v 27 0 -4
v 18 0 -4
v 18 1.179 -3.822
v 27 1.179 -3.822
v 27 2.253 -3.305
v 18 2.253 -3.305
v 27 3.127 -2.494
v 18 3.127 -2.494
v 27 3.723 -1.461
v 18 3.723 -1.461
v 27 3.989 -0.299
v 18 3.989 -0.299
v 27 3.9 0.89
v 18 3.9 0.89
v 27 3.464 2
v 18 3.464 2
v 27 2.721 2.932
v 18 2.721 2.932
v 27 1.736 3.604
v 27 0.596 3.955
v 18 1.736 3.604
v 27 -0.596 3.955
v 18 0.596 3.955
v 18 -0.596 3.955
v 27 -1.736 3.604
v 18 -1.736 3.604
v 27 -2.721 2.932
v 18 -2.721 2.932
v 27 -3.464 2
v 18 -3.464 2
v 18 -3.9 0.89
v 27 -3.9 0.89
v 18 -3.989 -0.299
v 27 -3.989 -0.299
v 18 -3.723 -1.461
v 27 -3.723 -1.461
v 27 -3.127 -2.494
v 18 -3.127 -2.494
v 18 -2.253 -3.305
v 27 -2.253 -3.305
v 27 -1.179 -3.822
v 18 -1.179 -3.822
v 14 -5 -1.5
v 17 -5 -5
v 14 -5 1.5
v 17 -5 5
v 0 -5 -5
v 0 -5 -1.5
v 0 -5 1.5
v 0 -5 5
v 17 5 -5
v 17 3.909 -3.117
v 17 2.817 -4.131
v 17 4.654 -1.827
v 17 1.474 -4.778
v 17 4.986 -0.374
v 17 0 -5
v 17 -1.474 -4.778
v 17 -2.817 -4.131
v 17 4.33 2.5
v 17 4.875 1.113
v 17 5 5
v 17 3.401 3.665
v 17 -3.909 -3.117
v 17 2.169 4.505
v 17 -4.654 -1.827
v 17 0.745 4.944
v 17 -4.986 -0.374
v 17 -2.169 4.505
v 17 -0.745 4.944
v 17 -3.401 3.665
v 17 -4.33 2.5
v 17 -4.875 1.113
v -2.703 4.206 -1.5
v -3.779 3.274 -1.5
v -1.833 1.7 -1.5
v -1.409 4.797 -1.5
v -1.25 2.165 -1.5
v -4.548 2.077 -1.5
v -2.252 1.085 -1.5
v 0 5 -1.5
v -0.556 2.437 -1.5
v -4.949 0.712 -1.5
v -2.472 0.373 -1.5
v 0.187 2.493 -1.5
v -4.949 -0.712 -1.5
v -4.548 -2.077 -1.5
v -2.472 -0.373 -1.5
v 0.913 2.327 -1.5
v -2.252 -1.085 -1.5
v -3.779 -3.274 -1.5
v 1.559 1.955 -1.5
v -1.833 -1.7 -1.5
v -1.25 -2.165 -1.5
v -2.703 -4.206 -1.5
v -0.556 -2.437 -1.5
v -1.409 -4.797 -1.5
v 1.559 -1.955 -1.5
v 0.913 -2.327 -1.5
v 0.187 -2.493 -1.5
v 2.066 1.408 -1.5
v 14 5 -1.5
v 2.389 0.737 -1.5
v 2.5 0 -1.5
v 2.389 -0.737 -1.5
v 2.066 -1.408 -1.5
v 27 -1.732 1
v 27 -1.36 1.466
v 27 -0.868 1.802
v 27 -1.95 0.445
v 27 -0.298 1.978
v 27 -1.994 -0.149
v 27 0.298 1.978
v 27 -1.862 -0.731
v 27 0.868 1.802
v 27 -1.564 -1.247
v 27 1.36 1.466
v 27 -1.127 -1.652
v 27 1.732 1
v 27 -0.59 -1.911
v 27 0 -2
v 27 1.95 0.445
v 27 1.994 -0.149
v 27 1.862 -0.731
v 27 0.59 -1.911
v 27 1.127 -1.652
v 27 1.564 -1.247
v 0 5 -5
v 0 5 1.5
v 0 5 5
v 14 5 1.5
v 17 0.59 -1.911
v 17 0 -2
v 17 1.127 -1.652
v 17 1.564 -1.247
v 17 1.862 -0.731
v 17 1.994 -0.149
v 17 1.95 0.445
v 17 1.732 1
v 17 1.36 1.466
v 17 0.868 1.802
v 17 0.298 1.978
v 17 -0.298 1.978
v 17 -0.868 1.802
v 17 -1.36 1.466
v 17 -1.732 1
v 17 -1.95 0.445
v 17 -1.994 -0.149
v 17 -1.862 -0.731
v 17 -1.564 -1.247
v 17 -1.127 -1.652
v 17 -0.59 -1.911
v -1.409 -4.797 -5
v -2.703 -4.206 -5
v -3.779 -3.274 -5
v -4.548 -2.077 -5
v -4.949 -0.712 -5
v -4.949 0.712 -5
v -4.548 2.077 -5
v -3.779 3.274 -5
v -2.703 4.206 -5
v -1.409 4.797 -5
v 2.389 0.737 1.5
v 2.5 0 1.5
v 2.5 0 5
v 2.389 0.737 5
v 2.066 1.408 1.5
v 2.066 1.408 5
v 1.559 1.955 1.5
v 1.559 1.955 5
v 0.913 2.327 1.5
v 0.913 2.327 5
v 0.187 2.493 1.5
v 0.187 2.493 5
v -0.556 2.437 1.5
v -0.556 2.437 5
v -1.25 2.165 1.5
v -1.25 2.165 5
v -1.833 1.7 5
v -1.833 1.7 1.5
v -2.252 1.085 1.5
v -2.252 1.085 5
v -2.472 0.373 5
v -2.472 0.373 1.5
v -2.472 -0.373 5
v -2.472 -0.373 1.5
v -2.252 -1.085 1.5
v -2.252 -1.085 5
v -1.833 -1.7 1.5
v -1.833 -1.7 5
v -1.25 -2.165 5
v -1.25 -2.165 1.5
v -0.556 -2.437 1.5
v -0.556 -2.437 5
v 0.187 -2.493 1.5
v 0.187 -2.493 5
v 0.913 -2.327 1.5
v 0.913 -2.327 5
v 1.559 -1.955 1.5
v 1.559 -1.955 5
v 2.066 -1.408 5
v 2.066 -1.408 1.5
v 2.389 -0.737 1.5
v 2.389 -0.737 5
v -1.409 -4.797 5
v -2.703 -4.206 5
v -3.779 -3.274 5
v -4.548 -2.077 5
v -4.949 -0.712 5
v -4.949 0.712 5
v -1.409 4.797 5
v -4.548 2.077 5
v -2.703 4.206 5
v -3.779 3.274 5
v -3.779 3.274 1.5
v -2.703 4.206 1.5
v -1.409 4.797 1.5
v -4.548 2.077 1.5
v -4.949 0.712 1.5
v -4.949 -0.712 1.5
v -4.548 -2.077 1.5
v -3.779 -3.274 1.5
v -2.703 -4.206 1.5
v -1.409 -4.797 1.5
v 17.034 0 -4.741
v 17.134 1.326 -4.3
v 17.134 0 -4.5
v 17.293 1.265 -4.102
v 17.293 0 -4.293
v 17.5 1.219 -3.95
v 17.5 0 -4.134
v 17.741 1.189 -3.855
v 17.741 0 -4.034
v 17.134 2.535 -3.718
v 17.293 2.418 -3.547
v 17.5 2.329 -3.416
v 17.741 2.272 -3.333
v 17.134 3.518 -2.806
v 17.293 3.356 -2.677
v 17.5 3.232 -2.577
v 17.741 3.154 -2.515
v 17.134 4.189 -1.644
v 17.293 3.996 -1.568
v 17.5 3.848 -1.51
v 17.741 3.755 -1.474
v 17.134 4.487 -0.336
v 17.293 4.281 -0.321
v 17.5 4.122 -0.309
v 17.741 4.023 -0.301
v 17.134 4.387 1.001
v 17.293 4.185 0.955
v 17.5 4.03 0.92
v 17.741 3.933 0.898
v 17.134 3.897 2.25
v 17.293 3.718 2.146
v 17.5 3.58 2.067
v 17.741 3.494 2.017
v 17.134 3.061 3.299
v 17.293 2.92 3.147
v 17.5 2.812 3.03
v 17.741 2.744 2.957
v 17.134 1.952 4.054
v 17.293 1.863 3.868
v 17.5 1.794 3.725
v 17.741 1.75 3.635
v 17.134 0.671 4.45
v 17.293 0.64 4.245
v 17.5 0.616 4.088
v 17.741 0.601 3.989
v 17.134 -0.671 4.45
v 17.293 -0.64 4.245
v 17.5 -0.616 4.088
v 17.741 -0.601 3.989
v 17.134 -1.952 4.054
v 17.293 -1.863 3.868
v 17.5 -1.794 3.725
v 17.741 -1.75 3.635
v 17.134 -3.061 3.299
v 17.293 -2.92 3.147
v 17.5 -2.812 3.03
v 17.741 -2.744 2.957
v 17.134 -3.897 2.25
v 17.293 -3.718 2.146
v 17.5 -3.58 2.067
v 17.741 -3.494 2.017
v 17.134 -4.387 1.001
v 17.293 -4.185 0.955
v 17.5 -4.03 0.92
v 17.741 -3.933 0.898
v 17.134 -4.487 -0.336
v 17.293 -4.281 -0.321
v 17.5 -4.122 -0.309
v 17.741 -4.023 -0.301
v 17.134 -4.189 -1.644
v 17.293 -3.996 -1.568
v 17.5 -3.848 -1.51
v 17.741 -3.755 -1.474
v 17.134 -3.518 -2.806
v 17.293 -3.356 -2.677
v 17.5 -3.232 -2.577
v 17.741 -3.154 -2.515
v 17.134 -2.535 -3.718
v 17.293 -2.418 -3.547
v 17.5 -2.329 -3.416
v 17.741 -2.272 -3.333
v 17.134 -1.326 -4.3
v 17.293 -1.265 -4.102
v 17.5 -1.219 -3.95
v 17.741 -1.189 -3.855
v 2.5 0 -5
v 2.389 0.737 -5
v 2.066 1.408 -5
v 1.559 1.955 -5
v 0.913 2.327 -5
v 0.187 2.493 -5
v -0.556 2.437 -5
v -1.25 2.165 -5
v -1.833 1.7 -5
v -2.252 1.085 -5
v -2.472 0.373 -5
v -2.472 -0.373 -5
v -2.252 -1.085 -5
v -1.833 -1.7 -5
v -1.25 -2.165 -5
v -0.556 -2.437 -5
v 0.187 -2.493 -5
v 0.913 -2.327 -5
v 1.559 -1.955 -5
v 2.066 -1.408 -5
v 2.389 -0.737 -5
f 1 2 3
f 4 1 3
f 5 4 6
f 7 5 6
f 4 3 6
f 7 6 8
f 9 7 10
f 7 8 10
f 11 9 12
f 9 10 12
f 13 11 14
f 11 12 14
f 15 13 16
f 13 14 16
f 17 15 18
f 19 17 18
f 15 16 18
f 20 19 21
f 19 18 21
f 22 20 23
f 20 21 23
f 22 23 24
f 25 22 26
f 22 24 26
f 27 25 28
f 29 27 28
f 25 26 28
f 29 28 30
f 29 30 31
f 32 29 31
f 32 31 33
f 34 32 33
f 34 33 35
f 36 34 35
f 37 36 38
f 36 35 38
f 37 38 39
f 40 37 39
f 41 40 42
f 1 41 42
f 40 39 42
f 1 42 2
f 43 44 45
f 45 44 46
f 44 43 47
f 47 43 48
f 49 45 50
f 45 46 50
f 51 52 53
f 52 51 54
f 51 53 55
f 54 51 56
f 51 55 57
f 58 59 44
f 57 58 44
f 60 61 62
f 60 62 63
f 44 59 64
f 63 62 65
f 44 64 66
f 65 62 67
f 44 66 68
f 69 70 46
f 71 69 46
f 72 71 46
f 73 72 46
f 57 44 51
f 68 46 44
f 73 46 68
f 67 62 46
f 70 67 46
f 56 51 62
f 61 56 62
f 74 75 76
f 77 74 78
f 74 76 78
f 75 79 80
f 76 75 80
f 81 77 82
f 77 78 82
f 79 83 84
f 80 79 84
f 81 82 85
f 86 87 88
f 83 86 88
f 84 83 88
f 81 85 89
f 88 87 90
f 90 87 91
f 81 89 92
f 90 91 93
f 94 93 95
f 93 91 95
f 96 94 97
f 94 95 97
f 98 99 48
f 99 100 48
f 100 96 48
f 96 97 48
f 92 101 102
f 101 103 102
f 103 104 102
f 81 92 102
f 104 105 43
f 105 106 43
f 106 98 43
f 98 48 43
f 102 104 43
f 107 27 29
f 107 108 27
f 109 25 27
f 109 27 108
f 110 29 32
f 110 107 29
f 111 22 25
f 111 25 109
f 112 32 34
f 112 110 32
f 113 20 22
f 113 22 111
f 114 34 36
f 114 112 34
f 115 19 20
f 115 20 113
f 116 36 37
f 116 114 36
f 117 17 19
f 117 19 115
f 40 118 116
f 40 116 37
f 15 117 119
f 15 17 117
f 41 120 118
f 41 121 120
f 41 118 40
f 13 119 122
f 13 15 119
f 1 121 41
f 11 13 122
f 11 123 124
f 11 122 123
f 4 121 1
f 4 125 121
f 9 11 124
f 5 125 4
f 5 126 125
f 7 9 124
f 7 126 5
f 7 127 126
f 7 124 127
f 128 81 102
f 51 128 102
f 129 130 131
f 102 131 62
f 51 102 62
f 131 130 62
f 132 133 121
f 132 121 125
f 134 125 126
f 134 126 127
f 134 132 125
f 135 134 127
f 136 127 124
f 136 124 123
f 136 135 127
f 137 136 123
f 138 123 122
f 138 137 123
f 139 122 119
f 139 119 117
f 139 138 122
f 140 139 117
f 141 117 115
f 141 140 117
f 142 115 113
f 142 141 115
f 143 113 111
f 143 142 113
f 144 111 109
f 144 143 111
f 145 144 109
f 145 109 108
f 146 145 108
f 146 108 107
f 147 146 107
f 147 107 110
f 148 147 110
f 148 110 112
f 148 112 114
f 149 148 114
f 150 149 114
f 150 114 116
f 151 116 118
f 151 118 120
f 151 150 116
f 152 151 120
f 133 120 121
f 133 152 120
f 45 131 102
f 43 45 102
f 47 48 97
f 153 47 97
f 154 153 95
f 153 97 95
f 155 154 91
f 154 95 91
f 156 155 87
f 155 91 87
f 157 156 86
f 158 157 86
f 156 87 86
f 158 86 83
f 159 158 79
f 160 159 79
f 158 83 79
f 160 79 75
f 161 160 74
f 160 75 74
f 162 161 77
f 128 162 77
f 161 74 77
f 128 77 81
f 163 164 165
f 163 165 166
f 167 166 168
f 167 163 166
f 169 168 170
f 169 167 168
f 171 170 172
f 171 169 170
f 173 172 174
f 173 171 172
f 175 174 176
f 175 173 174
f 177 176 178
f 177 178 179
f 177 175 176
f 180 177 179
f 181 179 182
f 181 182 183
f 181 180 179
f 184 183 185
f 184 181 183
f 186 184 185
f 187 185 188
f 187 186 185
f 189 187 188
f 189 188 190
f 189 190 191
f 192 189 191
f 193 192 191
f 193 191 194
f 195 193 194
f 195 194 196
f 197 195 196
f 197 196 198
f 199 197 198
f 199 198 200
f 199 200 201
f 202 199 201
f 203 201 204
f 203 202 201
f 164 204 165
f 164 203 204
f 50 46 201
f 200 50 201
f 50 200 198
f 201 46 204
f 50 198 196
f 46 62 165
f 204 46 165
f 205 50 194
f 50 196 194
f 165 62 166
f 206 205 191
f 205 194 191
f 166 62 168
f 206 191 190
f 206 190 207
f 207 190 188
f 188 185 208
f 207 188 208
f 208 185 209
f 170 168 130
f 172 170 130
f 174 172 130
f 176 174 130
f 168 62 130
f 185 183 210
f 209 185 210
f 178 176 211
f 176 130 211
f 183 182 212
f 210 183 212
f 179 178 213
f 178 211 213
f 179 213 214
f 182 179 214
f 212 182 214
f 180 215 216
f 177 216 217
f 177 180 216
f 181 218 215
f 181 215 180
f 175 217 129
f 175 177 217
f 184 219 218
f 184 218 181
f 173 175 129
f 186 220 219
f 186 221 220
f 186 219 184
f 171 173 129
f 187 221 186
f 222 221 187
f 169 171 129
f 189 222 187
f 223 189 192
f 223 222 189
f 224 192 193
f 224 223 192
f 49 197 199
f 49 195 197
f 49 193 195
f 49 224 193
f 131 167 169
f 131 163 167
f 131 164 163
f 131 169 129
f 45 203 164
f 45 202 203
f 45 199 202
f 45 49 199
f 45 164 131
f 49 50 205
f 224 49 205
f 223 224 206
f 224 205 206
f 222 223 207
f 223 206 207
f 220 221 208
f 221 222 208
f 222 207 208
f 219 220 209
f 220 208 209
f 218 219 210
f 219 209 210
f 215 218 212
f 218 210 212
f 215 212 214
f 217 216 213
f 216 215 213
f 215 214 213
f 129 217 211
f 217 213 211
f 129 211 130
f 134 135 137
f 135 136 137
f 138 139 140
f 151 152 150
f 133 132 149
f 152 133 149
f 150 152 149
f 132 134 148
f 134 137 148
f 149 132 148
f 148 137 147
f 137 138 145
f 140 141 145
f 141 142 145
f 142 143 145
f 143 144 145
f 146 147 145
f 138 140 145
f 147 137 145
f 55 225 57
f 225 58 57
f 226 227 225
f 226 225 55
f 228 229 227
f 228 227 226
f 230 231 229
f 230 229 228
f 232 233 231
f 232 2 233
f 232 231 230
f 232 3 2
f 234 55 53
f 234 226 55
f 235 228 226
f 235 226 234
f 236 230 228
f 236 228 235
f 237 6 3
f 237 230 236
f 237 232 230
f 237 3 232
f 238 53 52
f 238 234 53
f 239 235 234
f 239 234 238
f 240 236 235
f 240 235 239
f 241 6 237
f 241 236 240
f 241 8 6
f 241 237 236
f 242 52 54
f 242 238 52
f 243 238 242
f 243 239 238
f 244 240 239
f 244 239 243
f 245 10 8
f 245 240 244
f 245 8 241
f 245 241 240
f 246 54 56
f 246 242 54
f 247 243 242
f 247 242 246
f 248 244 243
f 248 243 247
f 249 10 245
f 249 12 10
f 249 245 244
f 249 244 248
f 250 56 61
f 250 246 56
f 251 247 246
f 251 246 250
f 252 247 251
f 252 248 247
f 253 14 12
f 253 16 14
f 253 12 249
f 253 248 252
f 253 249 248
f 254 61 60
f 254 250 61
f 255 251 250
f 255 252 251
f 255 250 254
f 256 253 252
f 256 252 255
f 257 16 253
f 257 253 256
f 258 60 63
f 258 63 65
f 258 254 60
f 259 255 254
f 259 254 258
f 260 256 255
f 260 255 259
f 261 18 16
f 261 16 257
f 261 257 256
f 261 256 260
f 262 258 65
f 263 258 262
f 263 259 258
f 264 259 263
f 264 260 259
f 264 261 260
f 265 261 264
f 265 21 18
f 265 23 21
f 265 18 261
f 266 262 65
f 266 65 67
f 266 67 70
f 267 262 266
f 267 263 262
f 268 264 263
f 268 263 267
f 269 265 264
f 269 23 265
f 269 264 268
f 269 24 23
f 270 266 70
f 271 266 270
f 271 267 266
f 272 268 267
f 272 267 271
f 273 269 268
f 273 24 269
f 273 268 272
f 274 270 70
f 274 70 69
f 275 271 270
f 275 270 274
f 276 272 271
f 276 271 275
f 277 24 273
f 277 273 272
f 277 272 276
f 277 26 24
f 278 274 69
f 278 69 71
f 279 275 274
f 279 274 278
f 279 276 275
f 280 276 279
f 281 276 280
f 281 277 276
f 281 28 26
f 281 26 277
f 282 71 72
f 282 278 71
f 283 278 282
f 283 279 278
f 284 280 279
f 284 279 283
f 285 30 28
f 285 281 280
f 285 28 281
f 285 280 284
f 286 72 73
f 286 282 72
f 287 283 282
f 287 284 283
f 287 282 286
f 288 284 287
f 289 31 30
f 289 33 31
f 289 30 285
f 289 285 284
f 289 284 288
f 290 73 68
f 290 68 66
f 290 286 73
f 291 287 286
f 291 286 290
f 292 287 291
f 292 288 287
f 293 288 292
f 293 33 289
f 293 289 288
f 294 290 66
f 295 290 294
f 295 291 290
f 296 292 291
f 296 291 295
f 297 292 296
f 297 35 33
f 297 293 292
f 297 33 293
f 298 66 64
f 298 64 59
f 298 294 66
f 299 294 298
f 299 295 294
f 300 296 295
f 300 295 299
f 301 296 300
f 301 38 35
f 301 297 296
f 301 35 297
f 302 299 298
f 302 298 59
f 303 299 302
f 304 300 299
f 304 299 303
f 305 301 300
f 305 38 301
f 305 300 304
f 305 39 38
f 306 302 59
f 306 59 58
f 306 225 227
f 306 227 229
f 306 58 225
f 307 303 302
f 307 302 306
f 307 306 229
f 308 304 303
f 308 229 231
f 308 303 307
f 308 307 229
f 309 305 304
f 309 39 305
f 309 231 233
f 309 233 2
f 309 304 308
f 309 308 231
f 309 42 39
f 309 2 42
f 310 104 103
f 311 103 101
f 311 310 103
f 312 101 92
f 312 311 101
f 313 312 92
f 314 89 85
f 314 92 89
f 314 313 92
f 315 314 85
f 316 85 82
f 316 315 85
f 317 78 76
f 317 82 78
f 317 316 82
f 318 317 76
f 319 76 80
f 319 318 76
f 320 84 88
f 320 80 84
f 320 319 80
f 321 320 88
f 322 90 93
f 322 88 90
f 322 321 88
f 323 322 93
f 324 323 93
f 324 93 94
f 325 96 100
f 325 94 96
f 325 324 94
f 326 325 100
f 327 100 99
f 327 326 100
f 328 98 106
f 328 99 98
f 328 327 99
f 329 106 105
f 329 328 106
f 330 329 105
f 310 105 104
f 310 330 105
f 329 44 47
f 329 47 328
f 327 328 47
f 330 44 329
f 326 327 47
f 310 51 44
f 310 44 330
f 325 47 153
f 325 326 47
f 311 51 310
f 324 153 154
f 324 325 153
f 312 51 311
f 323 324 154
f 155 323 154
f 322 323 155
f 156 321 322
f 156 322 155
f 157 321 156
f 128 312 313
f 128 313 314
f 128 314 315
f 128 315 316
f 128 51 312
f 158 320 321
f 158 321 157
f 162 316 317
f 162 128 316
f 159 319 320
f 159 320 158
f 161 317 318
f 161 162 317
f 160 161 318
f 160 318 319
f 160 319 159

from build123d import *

# Parameters (mm, degrees)
SKETCH1_R               = 2.5
BOSS_EXTRUDE1_DEPTH     = 5
CUT_EXTRUDE1_DEPTH      = 19.41195264
CUT_EXTRUDE1_DEPTH_BACK = 19.41195264
SKETCH2_W               = 19
SKETCH2_H               = 3
SKETCH3_R               = 4
SKETCH3_R_2             = 2
BOSS_EXTRUDE2_DEPTH     = 10
FILLET1_R               = 1


with BuildPart() as part:
    # Sketch1 → Boss-Extrude1 (new, symmetric)
    with BuildSketch(Plane.XY):
        with BuildLine():
            ThreePointArc((0, -5), (-5, 0), (0, 5))
            Line((0, 5), (17, 5))
            Line((17, 5), (17, -5))
            Line((17, -5), (0, -5))
        make_face()
        Circle(SKETCH1_R, mode=Mode.SUBTRACT)
    extrude(amount=BOSS_EXTRUDE1_DEPTH, both=True)

    # Sketch2 → Cut-Extrude1 (cut, two sides: drawn at the far end of the back side and taken through both)
    with BuildSketch(Plane(origin=(0, 0, 0), x_dir=(1, 0, 0), z_dir=(0, 1, 0)).offset(-CUT_EXTRUDE1_DEPTH_BACK)):
        with Locations((4.5, 0)):
            Rectangle(SKETCH2_W, SKETCH2_H)
    extrude(amount=CUT_EXTRUDE1_DEPTH + CUT_EXTRUDE1_DEPTH_BACK, mode=Mode.SUBTRACT)

    # Sketch3 → Boss-Extrude2 (add)
    with BuildSketch(Plane(origin=(17, 0, 0), x_dir=(0, 0, -1), z_dir=(1, 0, 0))):
        Circle(SKETCH3_R)
        Circle(SKETCH3_R_2, mode=Mode.SUBTRACT)
    extrude(amount=BOSS_EXTRUDE2_DEPTH)

    # Fillet1
    fillet1_edges = [part.edges().sort_by_distance(p)[0] for p in [
        (17, 0, 4),
    ]]
    fillet(fillet1_edges, radius=FILLET1_R - 0.0001)  # a hair under: the kernel refuses the full size


solid = part.part
